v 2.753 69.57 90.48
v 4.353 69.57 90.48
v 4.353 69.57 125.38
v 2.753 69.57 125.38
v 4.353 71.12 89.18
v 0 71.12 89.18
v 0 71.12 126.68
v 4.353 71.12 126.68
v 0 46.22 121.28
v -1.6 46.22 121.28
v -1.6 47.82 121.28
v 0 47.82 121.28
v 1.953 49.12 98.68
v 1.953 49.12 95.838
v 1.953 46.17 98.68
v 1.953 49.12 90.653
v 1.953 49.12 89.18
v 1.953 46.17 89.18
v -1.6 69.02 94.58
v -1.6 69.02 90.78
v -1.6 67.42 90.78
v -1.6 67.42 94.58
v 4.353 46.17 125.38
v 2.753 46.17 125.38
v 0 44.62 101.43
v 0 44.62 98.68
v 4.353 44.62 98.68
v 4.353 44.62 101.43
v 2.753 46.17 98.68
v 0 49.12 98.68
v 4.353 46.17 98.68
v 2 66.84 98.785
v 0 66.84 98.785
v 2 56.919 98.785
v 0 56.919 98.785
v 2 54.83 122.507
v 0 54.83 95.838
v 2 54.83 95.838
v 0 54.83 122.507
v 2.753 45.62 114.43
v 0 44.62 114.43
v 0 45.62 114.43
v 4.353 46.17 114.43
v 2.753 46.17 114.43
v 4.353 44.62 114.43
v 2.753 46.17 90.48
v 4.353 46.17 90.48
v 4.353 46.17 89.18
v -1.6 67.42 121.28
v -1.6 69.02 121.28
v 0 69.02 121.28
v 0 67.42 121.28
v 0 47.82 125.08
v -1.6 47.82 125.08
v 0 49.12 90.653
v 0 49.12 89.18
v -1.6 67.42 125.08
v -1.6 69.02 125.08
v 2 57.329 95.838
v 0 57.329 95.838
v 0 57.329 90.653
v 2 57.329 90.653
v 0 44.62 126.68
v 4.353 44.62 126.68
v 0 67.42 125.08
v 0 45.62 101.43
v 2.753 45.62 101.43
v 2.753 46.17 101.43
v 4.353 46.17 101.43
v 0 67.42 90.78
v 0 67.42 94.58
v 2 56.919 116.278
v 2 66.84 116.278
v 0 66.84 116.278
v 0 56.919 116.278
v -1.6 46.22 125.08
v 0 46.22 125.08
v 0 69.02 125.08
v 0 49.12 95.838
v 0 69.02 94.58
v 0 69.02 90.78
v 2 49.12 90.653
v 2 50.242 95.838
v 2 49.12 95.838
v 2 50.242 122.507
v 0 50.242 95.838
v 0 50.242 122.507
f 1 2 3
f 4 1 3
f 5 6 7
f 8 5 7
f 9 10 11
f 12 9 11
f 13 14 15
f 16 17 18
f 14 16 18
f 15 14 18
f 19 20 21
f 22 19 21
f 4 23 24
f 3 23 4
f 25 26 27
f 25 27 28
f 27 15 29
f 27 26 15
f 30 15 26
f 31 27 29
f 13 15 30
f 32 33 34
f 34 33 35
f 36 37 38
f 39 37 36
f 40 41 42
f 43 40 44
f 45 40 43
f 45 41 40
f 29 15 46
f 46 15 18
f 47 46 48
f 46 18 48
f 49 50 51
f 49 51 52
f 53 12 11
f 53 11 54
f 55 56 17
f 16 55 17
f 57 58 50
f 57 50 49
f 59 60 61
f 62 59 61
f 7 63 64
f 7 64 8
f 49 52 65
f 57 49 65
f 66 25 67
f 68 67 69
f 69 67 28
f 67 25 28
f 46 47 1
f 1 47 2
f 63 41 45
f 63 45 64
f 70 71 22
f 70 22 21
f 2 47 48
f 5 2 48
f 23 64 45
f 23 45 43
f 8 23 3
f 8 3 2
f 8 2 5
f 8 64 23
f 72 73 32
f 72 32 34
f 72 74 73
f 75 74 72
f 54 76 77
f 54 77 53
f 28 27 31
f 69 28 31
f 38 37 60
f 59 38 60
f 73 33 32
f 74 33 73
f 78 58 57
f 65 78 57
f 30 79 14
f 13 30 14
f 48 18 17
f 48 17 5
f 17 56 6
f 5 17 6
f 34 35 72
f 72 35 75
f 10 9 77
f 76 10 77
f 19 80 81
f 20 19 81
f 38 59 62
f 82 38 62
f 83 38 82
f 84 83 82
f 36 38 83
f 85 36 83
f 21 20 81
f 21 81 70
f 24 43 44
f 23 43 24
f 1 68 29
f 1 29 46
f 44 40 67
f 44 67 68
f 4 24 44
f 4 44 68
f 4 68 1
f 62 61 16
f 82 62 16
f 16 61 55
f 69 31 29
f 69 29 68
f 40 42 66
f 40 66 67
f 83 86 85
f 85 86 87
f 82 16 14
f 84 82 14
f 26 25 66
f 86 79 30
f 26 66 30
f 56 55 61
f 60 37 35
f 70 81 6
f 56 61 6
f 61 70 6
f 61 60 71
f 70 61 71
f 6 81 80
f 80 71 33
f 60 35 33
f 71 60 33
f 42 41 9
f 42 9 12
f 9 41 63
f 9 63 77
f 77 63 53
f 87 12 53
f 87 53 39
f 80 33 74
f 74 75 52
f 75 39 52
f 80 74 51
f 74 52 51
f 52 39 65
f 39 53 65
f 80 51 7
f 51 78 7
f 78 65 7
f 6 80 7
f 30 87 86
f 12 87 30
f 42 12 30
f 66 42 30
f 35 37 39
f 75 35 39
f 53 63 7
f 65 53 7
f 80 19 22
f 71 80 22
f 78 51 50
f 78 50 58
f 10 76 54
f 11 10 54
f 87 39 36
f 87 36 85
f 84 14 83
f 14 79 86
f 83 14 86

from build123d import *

# Parameters (mm, degrees)
SKETCH1_W           = 26.5
SKETCH1_H           = 37.5
BOSS_EXTRUDE1_DEPTH = 4.353
SKETCH2_W           = 23.4
SKETCH2_H           = 34.9
CUT_EXTRUDE1_DEPTH  = 1.6
SKETCH3_W           = 1.55
SKETCH3_H           = 13
CUT_EXTRUDE2_DEPTH  = 1.6
SKETCH4_W           = 2.753
SKETCH4_H           = 13
CUT_EXTRUDE3_DEPTH  = 1
SKETCH5_W           = 1.55
SKETCH5_H           = 9.5
CUT_EXTRUDE5_DEPTH  = 1.6
CUT_EXTRUDE6_DEPTH  = 9.5
SKETCH7_W           = 4.587747781
SKETCH7_H           = 26.668615153
SKETCH7_W_2         = 9.921470812
SKETCH7_H_2         = 17.49311959
CUT_EXTRUDE7_DEPTH  = 2
SKETCH8_W           = 1.6
SKETCH8_H           = 3.8
BOSS_EXTRUDE2_DEPTH = 1.6


with BuildPart() as part:
    # Sketch1 → Boss-Extrude1 (new body)
    with BuildSketch(Plane.YZ):
        with Locations((57.87, 107.93)):
            Rectangle(SKETCH1_W, SKETCH1_H)
    extrude(amount=BOSS_EXTRUDE1_DEPTH)

    # Sketch2 → Cut-Extrude1 (cut)
    with BuildSketch(Plane.YZ.offset(4.353)):
        with Locations((57.87, 107.93)):
            Rectangle(SKETCH2_W, SKETCH2_H)
    extrude(amount=-CUT_EXTRUDE1_DEPTH, mode=Mode.SUBTRACT)

    # Sketch3 → Cut-Extrude2 (cut)
    with BuildSketch(Plane.YZ.offset(4.353)):
        with Locations((45.395, 107.93)):
            Rectangle(SKETCH3_W, SKETCH3_H)
    extrude(amount=-CUT_EXTRUDE2_DEPTH, mode=Mode.SUBTRACT)

    # Sketch4 → Cut-Extrude3 (cut)
    with BuildSketch(Plane.XZ.offset(-44.62)):
        with Locations((1.3765, 107.93)):
            Rectangle(SKETCH4_W, SKETCH4_H)
    extrude(amount=-CUT_EXTRUDE3_DEPTH, mode=Mode.SUBTRACT)

    # Sketch5 → Cut-Extrude5 (cut)
    with BuildSketch(Plane.YZ.offset(4.353)):
        with Locations((45.395, 93.93)):
            Rectangle(SKETCH5_W, SKETCH5_H)
    extrude(amount=-CUT_EXTRUDE5_DEPTH, mode=Mode.SUBTRACT)

    # Sketch6 → Cut-Extrude6 (cut)
    with BuildSketch(Plane(origin=(0, 0, 89.18), x_dir=(1, 0, 0), z_dir=(0, 0, -1))):
        Polygon((1.953, -46.17), (2.753, -46.17), (2.753, -44.62), (0, -44.62), (0, -49.12), (1.953, -49.12), align=None)
    extrude(amount=-CUT_EXTRUDE6_DEPTH, mode=Mode.SUBTRACT)

    # Sketch7 → Cut-Extrude7 (cut)
    with BuildSketch(Plane(origin=(0, 0, 0), x_dir=(0, -1, 0), z_dir=(-1, 0, 0))):
        with Locations((-52.536232928, 109.172253496)):
            Rectangle(SKETCH7_W, SKETCH7_H)
        Polygon((-57.329123903, 95.837945919), (-57.329123903, 90.653417938), (-49.12, 90.653417938), (-49.12, 95.837945919), (-50.242359038, 95.837945919), (-54.830106819, 95.837945919), align=None)
        with Locations((-61.879572923, 107.531107948)):
            Rectangle(SKETCH7_W_2, SKETCH7_H_2)
    extrude(amount=-CUT_EXTRUDE7_DEPTH, mode=Mode.SUBTRACT)

    # Sketch8 → Boss-Extrude2 (add)
    with BuildSketch(Plane(origin=(0, 0, 0), x_dir=(0, -1, 0), z_dir=(-1, 0, 0))):
        with Locations((-68.22, 123.18)):
            Rectangle(SKETCH8_W, SKETCH8_H)
    boss_extrude2 = extrude(amount=BOSS_EXTRUDE2_DEPTH)

    # Mirror1: Boss-Extrude2 across plane
    add(boss_extrude2.mirror(Plane(origin=(0, 0, 107.93), x_dir=(1, 0, 0), z_dir=(0, 0, -1))))

    # Mirror2: Boss-Extrude2 across plane
    add(boss_extrude2.mirror(Plane(origin=(0, 57.62, 0), x_dir=(0, 0, 1), z_dir=(0, -1, 0))))


solid = part.part
